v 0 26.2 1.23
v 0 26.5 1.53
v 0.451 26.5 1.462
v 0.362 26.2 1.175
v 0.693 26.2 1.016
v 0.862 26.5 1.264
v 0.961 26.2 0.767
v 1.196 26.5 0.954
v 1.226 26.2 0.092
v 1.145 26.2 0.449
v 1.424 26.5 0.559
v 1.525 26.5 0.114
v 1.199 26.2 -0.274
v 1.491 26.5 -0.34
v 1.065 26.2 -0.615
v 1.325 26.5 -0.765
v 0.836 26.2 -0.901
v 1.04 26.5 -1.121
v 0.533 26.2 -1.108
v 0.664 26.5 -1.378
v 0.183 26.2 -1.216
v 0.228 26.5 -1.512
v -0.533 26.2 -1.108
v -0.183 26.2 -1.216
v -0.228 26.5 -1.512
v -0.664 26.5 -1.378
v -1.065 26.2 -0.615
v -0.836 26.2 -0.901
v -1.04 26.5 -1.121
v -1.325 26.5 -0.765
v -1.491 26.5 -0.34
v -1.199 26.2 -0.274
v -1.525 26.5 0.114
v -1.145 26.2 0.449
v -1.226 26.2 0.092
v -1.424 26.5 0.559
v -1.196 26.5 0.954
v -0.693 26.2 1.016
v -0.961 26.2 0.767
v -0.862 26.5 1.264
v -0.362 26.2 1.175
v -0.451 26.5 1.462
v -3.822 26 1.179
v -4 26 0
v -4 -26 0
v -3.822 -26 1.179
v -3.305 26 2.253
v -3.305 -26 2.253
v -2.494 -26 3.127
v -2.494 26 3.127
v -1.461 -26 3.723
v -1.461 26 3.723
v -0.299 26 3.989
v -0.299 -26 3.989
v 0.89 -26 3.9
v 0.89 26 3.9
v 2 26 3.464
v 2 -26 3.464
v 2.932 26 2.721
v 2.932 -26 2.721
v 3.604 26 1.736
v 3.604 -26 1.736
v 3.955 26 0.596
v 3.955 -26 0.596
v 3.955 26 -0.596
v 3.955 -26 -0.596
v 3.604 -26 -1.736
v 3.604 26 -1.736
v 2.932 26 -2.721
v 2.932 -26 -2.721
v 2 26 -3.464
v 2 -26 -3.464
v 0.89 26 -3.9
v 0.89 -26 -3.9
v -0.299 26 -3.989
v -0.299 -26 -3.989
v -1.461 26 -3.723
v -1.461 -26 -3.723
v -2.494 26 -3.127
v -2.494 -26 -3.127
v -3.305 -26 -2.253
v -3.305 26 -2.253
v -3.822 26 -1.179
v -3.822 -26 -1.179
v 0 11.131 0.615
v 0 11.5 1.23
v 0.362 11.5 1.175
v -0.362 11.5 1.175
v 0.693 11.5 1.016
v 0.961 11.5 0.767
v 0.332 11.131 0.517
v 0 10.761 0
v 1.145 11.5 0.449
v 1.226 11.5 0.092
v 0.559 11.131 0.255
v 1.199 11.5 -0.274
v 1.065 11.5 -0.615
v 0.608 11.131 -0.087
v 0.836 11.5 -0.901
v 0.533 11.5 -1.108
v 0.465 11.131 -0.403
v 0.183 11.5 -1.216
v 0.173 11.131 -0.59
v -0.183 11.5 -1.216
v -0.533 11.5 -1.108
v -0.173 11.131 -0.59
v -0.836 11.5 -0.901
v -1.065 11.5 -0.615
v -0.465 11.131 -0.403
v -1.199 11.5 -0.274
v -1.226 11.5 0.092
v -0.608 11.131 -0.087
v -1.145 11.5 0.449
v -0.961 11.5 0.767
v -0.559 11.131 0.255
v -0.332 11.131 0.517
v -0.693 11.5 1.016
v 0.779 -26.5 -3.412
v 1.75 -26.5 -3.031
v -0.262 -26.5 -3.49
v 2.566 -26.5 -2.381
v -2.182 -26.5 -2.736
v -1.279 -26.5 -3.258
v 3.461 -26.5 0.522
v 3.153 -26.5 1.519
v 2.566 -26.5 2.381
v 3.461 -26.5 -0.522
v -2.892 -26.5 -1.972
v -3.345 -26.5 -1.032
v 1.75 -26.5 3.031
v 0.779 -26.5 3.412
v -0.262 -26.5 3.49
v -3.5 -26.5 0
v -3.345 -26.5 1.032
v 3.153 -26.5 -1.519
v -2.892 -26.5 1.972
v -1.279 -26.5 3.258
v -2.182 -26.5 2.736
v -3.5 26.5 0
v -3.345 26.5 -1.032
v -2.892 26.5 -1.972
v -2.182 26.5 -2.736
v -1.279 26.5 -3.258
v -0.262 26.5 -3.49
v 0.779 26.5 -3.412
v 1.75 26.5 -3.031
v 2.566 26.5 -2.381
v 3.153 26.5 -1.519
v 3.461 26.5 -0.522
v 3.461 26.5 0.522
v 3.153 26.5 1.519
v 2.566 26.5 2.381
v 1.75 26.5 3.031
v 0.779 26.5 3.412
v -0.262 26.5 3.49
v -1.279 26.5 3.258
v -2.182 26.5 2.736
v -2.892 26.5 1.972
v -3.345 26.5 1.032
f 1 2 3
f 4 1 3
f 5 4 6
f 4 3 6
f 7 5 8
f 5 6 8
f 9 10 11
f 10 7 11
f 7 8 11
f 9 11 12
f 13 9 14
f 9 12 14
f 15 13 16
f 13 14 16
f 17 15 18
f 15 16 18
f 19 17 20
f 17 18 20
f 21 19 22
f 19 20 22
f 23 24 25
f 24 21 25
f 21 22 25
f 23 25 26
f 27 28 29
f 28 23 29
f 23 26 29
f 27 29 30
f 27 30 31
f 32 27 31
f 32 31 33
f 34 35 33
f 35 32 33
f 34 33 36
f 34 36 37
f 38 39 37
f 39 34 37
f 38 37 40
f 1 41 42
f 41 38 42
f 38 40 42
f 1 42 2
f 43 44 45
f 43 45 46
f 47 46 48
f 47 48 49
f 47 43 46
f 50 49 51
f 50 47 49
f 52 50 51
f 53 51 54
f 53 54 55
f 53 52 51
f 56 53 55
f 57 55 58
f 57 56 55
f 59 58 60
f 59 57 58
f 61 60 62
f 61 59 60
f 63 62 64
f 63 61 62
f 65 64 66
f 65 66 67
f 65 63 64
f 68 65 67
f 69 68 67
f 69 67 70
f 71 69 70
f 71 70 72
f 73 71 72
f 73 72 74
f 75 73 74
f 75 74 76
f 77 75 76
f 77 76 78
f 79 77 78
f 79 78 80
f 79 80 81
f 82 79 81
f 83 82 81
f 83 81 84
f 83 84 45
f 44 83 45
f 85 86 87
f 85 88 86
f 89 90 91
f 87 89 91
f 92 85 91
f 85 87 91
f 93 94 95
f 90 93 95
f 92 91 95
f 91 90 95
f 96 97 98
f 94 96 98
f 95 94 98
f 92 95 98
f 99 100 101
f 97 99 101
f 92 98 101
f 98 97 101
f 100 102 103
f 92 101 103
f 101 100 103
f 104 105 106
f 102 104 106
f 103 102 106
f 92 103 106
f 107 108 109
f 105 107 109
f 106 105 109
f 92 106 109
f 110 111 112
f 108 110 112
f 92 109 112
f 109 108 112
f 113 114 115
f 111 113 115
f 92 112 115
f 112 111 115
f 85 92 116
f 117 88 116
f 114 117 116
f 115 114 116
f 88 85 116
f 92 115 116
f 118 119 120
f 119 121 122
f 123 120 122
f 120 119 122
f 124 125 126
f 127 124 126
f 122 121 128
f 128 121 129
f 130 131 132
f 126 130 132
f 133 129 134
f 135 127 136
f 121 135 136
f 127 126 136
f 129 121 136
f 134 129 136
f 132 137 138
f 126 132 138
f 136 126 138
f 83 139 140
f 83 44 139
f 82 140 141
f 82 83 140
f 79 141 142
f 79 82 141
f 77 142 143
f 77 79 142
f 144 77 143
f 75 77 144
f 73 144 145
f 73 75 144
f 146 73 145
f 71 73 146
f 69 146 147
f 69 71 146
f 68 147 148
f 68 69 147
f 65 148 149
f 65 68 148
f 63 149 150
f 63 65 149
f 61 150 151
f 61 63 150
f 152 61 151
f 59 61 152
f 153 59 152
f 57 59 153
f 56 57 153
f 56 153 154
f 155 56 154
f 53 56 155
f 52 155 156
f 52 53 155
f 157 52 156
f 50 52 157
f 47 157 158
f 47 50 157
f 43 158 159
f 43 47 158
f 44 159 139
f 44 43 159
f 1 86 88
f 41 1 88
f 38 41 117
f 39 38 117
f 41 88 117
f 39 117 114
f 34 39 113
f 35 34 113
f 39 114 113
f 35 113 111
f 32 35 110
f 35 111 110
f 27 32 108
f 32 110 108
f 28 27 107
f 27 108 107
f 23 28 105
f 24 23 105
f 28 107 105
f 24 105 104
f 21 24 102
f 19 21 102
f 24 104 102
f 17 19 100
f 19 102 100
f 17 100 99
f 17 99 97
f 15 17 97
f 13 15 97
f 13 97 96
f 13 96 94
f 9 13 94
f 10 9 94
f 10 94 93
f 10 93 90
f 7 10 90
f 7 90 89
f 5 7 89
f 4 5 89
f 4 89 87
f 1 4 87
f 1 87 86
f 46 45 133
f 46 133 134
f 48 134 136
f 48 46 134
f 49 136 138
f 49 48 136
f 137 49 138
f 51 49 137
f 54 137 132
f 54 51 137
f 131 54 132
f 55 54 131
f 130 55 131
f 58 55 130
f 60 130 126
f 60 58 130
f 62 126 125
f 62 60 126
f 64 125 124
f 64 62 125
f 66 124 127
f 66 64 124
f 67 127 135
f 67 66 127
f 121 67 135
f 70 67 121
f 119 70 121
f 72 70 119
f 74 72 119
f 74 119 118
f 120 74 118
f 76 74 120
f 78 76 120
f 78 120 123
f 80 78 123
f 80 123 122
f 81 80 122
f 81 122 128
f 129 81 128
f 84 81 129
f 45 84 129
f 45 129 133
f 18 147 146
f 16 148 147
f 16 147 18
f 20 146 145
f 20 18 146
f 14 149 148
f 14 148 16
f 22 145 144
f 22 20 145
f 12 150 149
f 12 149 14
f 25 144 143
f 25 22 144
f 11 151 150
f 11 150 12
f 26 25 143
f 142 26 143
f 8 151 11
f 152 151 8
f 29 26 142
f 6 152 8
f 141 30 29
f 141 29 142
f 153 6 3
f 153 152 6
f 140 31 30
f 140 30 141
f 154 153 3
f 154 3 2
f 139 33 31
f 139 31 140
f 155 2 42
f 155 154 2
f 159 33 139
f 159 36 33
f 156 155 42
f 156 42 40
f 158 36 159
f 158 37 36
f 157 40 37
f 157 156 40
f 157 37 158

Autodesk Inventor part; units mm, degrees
ref_plane "YZ Plane" through (0, 0, 0) normal (1, 0, 0) x (0, 1, 0)
ref_plane "XZ Plane" through (0, 0, 0) normal (0, 1, 0) x (-1, 0, 0)
ref_plane "XY Plane" through (0, 0, 0) normal (0, 0, 1) x (1, 0, 0)
sketch "Sketch1" plane through (0, 0, 0) normal (0, 0, 1) x (1, 0, 0)
  line L0 (-4.8, 0) -> (0.8, 0) construction
  line L1 (0, -37.1) -> (0, 37.1) construction
  line L2 (-4, 26.5) -> (0, 26.5)
  line L3 (0, 26.5) -> (0, -26.5)
  line L4 (0, -26.5) -> (-4, -26.5)
  line L5 (-4, -26.5) -> (-4, 26.5)
  point P0 (0, 0)
  dimension "d1" = 53
  dimension "d16" = 8
revolve "Revolution1" add sketch "Sketch1" angle 360 about axis through (0, -10, 0) along (0, 1, 0)
sketch "Sketch2" plane through (0, 26.5, 0) normal (0, 1, 0) x (1, 0, 0)
  circle A0 centre (0, 0) radius 4 projected
hole "Hole1" at (0, 26.5, 0) direction (0, -1, 0) diameter 2.459 depth 15 tip angle 118 thread size "M3x0.5" class "6H" standard "ISO Metric profile"
mirror "Espelhar1" [suppressed]
chamfer "Chamfer1" distance 0.5 angle 45 2 edges at (4, -26.5, 0) (4, 26.5, 0)
chamfer "Chamfer2" distance 0.3 angle 45 1 edges at (0, 26.5, -1.2295)
properties part number "GRJ-05-104" material "Poliacetal WT"
